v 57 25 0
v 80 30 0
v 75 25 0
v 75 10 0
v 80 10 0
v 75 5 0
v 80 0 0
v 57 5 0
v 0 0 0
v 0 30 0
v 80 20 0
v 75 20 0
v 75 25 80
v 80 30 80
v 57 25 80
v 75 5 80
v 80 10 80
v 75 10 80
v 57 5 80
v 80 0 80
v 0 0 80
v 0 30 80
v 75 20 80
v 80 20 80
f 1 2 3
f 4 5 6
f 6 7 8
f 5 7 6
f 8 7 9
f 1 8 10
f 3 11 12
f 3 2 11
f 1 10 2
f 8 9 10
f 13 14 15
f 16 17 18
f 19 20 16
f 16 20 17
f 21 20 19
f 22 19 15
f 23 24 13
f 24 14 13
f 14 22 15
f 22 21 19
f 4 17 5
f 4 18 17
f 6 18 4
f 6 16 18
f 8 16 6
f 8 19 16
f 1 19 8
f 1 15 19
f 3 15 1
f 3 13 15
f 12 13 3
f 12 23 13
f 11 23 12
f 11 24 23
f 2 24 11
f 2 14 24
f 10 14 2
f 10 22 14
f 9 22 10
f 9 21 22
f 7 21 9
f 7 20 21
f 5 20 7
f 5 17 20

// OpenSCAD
$fn = 32;

// ----------------------------------------------------------------------
// T-slot rail: 80 x 30 mm section, 80 mm long
// ----------------------------------------------------------------------

// --- parameters (mm) ---
profile_height = 80;      // extrusion height
profile_points = 12;      // points of the closed outline

profile = [[0, 0], [80, 0], [80, 10], [75, 10], [75, 5], [57, 5], [57, 25], [75, 25], [75, 20], [80, 20], [80, 30], [0, 30]];  // single closed polygon, 12 points, counter clockwise

// --- the one profile operation ---
linear_extrude(height = profile_height) polygon(points = profile);
